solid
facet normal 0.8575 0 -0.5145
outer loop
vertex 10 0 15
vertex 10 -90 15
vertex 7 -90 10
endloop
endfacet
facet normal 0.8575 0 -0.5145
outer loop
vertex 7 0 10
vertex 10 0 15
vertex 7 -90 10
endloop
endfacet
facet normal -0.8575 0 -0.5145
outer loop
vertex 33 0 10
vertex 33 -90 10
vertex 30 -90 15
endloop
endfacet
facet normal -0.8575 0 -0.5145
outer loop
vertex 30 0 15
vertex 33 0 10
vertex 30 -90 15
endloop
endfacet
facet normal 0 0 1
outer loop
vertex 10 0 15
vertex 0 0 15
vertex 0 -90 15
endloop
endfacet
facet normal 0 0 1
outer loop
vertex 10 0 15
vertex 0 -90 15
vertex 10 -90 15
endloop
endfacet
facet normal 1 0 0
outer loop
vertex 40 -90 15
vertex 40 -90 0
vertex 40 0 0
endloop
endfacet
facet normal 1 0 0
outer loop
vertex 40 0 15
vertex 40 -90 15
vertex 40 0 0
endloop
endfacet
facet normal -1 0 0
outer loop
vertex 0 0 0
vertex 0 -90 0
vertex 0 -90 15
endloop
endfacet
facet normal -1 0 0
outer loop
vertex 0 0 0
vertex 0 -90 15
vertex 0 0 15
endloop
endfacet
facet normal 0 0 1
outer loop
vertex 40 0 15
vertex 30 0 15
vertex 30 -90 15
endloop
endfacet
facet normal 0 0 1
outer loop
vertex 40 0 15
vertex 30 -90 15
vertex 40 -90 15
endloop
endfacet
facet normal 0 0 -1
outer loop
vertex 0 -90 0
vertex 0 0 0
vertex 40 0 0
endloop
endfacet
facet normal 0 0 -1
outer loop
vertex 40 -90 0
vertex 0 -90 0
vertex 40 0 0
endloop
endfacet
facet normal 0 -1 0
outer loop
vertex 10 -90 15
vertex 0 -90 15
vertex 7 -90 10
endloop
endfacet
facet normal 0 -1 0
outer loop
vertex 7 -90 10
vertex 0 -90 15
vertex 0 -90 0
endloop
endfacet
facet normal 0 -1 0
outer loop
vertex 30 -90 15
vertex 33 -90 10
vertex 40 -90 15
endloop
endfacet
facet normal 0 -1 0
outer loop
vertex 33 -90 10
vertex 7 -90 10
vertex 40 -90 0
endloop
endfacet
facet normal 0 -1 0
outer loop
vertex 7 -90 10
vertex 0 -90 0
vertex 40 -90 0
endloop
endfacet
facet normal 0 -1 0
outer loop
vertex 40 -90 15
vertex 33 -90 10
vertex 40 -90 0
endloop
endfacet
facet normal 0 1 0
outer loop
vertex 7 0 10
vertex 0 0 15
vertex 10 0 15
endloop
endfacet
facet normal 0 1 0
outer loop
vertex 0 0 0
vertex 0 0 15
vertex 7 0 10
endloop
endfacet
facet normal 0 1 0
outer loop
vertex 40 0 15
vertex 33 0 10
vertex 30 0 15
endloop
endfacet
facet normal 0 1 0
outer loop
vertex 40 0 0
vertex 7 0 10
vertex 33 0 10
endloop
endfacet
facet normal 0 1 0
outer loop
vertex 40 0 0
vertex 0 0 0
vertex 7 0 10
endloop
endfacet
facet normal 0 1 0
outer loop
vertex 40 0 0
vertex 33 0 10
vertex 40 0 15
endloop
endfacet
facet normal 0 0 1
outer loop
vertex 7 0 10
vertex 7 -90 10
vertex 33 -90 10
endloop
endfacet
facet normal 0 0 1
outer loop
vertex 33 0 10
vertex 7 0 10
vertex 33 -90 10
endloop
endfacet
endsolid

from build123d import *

# Parameters (mm, degrees)
SKETCH_1_W          = 40
SKETCH_1_H          = 90
EXTRUDE_1_DEPTH     = 15
CUT_EXTRUDE_1_DEPTH = 100.624294226


with BuildPart() as part:
    # 草图1 → 凸台-拉伸1 (new body)
    with BuildSketch(Plane.XY):
        with Locations((20, -45)):
            Rectangle(SKETCH_1_W, SKETCH_1_H)
    extrude(amount=EXTRUDE_1_DEPTH)

    # 草图2 → 切除-拉伸1 (cut, through all)
    with BuildSketch(Plane.XZ.offset(90)):
        Polygon((10, 15), (7, 10), (33, 10), (30, 15), align=None)
    extrude(amount=-CUT_EXTRUDE_1_DEPTH, mode=Mode.SUBTRACT)


solid = part.part
